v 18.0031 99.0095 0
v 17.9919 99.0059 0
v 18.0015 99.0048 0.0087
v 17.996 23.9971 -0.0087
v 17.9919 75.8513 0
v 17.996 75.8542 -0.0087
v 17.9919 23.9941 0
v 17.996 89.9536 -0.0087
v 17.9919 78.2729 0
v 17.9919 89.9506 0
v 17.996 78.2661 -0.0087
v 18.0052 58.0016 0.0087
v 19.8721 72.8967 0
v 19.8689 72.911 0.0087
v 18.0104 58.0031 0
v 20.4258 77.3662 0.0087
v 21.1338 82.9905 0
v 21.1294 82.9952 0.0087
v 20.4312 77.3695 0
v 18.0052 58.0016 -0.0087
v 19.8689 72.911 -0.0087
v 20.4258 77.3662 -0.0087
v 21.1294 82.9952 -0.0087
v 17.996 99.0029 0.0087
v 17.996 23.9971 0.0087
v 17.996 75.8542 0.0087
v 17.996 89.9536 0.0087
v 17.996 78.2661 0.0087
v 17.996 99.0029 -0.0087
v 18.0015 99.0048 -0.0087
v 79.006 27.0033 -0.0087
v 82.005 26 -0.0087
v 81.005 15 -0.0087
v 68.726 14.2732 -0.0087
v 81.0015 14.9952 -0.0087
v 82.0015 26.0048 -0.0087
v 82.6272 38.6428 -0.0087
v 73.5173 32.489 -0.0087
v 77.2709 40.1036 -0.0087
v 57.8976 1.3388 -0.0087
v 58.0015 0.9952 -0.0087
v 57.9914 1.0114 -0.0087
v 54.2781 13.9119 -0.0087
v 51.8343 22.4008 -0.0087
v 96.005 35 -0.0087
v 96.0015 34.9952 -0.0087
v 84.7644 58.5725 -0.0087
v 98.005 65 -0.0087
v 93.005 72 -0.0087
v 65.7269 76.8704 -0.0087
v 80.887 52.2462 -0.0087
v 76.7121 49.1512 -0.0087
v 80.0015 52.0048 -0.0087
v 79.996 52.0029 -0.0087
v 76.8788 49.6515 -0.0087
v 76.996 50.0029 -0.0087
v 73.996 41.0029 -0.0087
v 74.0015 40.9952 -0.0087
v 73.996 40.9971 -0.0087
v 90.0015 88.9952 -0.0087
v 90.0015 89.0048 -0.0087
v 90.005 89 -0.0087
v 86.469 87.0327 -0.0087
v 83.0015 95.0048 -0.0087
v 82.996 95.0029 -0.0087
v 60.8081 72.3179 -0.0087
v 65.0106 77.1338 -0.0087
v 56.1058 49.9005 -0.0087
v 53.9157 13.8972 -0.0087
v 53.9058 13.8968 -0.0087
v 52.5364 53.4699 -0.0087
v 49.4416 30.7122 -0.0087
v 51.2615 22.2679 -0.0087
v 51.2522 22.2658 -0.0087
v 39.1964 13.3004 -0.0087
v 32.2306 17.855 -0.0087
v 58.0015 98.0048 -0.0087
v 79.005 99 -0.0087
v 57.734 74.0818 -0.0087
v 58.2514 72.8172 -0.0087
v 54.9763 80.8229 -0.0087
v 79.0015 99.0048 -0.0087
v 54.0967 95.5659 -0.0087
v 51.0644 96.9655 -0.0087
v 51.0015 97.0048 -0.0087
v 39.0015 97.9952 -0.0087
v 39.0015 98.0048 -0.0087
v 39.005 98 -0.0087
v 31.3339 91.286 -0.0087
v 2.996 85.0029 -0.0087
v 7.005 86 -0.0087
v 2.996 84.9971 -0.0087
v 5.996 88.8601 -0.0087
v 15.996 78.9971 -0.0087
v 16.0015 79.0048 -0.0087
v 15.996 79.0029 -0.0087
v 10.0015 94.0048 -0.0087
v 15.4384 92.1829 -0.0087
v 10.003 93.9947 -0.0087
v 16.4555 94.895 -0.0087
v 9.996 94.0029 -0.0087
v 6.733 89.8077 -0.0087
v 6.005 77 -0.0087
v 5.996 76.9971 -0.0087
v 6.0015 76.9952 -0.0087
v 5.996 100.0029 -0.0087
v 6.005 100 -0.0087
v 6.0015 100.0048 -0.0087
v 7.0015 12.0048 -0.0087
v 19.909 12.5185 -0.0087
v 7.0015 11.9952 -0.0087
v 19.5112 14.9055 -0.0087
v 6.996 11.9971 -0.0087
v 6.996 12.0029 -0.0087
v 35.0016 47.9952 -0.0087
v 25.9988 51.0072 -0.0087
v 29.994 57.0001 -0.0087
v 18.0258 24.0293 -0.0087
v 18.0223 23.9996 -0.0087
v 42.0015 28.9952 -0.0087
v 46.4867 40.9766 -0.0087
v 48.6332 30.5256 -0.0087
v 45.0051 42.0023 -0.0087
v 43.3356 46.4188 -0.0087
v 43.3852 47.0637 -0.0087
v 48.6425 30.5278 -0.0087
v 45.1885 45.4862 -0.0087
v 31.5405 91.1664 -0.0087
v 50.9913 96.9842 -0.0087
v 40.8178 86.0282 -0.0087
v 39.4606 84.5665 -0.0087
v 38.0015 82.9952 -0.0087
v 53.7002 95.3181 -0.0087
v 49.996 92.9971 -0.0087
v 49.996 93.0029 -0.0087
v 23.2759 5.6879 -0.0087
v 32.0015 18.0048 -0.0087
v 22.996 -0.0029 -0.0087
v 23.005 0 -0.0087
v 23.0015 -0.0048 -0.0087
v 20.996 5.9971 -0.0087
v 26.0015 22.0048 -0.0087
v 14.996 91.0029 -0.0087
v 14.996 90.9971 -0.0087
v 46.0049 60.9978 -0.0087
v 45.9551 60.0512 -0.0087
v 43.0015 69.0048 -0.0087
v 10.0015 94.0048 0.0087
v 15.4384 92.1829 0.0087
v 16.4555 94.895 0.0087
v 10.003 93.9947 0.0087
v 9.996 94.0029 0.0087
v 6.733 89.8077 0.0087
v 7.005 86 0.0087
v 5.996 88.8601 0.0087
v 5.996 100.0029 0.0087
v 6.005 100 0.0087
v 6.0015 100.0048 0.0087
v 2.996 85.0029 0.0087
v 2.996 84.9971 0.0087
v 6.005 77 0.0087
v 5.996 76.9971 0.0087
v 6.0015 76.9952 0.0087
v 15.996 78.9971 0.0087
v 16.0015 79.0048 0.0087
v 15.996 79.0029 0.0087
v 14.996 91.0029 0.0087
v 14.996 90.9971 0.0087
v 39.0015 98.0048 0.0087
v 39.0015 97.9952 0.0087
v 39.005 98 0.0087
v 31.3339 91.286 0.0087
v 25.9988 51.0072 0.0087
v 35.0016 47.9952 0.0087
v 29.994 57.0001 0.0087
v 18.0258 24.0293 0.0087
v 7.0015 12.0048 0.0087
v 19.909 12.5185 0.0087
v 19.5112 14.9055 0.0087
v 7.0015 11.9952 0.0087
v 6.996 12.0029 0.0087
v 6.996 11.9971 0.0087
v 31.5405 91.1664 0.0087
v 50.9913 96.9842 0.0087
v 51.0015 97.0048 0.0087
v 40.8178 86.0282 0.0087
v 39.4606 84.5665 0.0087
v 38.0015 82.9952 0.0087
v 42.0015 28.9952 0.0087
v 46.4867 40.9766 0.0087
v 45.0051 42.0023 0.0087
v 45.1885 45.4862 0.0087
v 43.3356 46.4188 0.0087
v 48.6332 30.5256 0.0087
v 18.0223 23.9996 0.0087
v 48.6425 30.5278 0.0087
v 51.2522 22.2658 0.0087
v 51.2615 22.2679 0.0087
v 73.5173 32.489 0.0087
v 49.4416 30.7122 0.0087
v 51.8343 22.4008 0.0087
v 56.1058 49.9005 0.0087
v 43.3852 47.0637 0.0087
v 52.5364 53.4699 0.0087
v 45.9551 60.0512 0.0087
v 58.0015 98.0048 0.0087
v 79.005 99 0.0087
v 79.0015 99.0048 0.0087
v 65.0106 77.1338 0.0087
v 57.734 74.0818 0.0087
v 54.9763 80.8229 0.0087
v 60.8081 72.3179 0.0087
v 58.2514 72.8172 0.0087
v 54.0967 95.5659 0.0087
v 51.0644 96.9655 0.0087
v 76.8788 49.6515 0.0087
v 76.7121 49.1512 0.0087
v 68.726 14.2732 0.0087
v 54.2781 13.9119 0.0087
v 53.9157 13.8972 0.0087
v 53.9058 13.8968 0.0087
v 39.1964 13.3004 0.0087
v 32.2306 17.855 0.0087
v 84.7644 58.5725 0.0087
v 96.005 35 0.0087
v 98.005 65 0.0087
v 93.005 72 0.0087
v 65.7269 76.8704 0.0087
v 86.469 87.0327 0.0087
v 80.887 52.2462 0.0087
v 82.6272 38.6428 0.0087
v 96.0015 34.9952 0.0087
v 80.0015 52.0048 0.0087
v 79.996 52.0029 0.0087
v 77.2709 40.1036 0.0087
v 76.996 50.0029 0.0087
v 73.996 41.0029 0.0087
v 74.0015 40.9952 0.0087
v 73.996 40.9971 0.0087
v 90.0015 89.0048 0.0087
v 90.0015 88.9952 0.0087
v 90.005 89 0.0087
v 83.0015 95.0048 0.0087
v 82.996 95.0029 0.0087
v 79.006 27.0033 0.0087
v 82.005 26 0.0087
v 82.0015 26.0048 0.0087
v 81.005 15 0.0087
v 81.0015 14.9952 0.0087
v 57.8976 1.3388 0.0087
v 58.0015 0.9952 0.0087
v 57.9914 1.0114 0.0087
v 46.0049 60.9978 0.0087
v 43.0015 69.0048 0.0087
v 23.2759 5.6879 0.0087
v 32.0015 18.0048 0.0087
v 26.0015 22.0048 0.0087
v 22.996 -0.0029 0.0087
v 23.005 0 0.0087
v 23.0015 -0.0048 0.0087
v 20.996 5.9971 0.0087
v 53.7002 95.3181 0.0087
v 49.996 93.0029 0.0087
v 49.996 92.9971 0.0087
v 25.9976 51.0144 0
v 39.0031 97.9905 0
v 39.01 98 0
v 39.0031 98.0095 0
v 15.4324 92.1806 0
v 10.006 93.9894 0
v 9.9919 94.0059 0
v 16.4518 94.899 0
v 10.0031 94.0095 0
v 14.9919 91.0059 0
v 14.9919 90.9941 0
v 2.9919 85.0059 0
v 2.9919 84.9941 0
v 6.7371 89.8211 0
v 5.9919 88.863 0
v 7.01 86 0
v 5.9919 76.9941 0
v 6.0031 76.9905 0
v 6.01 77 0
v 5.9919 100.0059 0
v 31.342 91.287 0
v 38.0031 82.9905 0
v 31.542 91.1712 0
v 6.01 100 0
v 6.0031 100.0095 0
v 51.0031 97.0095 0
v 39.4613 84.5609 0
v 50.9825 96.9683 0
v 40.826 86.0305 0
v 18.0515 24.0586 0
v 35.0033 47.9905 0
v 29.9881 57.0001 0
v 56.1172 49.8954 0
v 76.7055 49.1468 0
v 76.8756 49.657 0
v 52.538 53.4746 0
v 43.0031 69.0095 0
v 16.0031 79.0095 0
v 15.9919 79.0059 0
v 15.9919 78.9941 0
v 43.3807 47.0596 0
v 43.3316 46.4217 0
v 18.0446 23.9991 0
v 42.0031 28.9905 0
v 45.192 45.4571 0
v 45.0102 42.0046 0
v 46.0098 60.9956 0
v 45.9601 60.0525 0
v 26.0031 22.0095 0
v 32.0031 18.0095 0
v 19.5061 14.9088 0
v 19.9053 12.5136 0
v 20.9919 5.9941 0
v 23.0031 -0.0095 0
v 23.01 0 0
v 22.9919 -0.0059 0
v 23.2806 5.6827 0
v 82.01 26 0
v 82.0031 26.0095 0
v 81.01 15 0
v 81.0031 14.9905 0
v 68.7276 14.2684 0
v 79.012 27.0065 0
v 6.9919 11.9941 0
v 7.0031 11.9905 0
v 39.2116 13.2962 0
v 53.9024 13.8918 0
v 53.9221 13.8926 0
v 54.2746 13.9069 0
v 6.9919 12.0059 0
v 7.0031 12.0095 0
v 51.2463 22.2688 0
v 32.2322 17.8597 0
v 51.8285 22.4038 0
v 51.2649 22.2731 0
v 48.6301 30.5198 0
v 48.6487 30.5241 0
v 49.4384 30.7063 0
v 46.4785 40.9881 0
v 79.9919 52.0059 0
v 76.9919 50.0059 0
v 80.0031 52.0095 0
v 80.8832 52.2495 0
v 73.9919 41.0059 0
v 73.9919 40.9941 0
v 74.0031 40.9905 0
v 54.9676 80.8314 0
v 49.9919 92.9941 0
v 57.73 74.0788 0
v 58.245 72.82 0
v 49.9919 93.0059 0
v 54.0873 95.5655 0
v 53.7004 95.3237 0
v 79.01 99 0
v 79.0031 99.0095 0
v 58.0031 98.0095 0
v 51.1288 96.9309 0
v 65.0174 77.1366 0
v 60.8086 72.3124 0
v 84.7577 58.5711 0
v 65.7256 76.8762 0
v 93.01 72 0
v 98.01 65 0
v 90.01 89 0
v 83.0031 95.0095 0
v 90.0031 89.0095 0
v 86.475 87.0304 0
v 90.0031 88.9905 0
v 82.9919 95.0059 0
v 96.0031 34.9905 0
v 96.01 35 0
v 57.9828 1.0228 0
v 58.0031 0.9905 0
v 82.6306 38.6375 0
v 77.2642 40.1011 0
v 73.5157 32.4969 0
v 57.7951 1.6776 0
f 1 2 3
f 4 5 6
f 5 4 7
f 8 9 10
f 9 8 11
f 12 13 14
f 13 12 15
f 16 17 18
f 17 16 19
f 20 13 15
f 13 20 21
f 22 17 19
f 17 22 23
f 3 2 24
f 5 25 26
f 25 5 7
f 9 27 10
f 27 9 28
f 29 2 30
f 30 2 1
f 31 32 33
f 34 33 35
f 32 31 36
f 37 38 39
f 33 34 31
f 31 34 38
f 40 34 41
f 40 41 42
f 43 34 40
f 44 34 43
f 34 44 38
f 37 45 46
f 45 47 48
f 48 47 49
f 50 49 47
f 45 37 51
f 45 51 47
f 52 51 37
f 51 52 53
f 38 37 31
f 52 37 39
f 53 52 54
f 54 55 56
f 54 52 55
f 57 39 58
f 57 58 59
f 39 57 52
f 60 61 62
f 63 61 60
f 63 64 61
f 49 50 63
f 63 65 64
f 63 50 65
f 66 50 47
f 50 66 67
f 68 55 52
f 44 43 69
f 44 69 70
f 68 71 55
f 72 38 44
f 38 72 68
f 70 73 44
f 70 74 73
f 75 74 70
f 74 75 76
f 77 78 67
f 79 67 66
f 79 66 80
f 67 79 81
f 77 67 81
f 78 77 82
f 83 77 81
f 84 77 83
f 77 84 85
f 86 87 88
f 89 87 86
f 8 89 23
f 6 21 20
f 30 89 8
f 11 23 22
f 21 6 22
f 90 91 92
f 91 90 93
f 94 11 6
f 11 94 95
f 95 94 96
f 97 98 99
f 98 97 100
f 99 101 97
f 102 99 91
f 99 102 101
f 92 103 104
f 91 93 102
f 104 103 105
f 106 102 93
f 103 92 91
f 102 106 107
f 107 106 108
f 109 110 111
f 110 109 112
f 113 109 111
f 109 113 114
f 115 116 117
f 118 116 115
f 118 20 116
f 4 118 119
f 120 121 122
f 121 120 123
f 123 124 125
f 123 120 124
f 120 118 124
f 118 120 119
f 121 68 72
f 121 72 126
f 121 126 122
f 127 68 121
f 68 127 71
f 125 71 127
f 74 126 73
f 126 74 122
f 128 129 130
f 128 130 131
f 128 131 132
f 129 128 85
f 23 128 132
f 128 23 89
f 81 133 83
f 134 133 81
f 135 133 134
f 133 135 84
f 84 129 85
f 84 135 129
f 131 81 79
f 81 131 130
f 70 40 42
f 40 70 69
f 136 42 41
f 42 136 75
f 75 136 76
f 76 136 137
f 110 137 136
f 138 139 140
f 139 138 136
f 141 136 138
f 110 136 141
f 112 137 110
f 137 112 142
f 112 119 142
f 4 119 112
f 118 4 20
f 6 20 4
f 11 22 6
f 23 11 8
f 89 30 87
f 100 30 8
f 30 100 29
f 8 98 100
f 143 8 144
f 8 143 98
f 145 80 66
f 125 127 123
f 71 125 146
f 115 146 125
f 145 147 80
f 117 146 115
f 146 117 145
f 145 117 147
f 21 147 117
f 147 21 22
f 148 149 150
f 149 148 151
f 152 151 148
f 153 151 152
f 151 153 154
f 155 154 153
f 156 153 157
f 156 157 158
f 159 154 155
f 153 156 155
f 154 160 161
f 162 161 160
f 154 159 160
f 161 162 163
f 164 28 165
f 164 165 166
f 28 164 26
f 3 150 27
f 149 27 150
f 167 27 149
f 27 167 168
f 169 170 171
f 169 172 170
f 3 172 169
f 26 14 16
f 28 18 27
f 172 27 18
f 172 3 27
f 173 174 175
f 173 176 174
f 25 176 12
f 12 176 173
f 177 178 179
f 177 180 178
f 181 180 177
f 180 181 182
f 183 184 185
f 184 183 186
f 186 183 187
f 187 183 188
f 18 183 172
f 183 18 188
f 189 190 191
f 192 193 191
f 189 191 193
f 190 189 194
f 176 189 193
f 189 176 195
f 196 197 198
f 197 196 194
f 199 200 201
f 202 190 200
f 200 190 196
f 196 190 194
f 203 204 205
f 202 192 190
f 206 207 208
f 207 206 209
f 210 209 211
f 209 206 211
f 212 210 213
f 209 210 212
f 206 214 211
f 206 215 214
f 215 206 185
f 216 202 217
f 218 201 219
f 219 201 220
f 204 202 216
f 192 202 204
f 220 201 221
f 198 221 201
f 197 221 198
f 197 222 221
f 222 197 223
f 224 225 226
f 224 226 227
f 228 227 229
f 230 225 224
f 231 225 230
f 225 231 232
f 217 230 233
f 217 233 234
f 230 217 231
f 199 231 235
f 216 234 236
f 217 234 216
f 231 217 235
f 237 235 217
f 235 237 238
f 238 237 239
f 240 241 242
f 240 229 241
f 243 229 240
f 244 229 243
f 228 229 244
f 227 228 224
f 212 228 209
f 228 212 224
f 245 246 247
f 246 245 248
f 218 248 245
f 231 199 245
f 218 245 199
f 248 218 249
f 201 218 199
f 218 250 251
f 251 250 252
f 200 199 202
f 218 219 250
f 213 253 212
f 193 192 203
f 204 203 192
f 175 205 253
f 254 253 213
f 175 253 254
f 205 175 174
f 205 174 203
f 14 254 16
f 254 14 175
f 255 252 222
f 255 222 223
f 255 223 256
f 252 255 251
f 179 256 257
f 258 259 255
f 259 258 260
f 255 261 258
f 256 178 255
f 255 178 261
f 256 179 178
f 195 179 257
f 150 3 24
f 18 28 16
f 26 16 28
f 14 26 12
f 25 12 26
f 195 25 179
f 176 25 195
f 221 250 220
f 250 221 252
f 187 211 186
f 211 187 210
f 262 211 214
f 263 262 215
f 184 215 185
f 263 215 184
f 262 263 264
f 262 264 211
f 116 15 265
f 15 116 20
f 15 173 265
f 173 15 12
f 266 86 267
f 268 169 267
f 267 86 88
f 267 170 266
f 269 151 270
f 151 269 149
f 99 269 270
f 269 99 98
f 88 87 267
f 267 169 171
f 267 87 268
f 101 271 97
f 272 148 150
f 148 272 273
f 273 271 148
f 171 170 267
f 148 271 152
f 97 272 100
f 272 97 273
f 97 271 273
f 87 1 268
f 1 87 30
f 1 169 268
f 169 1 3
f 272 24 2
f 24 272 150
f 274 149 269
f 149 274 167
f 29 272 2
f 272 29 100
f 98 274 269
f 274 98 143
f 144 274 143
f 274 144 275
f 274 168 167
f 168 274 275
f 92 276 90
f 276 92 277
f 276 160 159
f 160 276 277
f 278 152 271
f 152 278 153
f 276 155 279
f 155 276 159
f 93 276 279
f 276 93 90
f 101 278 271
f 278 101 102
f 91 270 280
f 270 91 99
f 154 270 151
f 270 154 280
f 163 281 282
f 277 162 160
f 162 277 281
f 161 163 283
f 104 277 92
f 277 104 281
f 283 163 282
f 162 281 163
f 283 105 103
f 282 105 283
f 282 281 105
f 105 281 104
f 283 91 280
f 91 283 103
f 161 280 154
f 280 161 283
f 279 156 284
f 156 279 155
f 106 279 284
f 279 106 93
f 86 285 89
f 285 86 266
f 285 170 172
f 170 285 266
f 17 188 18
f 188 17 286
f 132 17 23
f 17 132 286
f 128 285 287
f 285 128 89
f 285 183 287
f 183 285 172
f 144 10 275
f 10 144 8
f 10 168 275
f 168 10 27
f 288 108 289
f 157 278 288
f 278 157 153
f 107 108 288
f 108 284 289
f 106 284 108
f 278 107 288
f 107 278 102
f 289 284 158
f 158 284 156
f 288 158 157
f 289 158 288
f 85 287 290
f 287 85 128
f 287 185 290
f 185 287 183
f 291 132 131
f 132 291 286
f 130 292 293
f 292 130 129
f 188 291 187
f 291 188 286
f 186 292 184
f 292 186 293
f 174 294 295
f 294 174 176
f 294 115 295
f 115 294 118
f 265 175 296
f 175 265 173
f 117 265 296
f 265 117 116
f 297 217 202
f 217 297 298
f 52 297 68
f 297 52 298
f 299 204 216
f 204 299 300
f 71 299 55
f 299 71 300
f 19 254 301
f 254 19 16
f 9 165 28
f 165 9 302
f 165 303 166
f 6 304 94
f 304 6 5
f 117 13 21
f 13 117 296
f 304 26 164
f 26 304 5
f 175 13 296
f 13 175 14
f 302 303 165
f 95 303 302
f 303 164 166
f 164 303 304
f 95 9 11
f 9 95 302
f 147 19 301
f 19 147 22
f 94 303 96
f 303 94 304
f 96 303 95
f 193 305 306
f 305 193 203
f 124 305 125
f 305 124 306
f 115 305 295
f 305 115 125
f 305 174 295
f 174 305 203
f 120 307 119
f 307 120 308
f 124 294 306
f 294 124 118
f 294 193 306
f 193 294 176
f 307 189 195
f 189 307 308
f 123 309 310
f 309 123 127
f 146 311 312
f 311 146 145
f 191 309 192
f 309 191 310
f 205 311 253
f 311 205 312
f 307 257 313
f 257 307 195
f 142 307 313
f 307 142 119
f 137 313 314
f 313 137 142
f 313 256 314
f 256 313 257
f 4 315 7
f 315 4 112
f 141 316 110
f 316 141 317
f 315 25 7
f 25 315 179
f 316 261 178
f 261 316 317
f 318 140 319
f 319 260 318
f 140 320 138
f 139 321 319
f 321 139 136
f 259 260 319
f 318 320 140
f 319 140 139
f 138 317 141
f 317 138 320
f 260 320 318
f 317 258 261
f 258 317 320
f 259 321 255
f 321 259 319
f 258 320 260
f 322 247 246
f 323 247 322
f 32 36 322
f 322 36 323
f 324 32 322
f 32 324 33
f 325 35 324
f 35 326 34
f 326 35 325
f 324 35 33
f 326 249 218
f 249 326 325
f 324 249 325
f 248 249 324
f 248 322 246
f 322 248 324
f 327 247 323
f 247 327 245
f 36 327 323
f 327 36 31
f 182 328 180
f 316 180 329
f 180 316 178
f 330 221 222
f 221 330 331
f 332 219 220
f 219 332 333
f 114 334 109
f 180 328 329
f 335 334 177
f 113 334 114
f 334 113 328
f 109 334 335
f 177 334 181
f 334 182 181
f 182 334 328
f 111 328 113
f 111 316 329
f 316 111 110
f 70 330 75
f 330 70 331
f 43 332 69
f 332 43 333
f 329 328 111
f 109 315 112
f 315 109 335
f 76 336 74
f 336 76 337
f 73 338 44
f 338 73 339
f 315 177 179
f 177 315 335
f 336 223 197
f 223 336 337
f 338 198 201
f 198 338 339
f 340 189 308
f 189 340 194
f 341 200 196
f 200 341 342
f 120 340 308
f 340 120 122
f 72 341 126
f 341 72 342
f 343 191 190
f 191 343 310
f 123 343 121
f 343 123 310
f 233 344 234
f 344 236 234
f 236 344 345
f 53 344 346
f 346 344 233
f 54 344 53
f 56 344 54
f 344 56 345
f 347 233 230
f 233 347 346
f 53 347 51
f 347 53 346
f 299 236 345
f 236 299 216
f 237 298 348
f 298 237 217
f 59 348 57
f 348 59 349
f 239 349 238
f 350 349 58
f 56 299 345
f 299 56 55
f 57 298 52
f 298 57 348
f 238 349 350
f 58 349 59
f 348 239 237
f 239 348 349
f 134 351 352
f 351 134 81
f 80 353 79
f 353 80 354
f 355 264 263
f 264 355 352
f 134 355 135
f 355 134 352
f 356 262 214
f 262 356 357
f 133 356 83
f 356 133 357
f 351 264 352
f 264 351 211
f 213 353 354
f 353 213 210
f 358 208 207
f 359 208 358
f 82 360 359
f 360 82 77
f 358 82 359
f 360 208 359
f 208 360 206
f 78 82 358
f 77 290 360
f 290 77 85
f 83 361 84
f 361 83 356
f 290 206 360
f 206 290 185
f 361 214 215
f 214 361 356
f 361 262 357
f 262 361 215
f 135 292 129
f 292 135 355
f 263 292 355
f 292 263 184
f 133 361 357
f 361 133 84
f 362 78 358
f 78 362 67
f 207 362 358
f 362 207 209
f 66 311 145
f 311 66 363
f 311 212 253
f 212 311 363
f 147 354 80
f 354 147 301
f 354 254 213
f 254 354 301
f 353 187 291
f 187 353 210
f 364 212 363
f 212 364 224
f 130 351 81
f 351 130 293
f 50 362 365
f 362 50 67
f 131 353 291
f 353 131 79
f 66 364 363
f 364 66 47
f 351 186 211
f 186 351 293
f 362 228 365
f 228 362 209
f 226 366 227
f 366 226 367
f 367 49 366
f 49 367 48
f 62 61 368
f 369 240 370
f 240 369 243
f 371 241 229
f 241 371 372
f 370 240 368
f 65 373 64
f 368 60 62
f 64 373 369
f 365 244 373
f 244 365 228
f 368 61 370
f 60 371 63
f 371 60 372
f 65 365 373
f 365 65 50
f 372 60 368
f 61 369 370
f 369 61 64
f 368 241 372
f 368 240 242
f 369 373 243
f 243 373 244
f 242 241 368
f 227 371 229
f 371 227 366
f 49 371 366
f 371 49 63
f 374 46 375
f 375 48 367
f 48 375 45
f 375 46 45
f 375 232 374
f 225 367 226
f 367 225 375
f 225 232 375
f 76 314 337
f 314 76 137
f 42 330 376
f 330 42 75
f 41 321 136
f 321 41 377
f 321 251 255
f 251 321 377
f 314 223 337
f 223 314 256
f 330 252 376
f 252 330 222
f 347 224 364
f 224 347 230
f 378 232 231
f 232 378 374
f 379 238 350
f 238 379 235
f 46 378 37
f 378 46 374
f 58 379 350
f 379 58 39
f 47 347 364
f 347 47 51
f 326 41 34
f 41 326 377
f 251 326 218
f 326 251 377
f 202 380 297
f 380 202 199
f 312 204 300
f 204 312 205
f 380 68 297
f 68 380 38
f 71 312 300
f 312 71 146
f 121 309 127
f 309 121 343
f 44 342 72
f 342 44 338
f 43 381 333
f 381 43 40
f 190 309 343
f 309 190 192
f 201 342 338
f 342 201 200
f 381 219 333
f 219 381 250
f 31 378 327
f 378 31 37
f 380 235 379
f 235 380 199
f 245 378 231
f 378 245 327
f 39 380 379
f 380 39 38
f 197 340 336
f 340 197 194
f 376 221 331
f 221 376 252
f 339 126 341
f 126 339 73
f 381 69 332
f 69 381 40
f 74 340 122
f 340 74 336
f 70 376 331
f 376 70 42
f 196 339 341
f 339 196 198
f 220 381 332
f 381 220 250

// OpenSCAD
color([0.7462272619347637,0.5039790716190428,0.8850839351693509]) hull(){
    translate([18,58]) sphere(0.01);
    translate([22,90]) sphere(0.01);
    translate([18,99]) sphere(0.01);
}
color([0.6652757233710683,0.22263754843686523,0.08942086350367451]) hull(){
    translate([18,58]) sphere(0.01);
    translate([18,24]) sphere(0.01);
    translate([26,51]) sphere(0.01);
}
color([0.6195232841458308,0.9036720387350747,0.7222923954673625]) hull(){
    translate([22,90]) sphere(0.01);
    translate([10,94]) sphere(0.01);
    translate([39,98]) sphere(0.01);
}
color([0.6665075097113882,0.5421139713900744,0.6943978877819516]) hull(){
    translate([22,90]) sphere(0.01);
    translate([39,98]) sphere(0.01);
    translate([18,99]) sphere(0.01);
}
color([0.9269770591996176,0.12480324665016229,0.8422397758241813]) hull(){
    translate([22,90]) sphere(0.01);
    translate([20,83]) sphere(0.01);
    translate([18,99]) sphere(0.01);
}
color([0.028249143050612435,0.8554899328562455,0.6212809598996976]) hull(){
    translate([22,90]) sphere(0.01);
    translate([18,99]) sphere(0.01);
    translate([15,91]) sphere(0.01);
}
color([0.6435486749275994,0.4857227915978113,0.2898251547629681]) hull(){
    translate([10,94]) sphere(0.01);
    translate([6,84]) sphere(0.01);
    translate([3,85]) sphere(0.01);
}
color([0.21709076393122206,0.4979948584580751,0.6176241526046676]) hull(){
    translate([10,94]) sphere(0.01);
    translate([3,85]) sphere(0.01);
    translate([7,86]) sphere(0.01);
}
color([0.4722249532281336,0.7228331534363125,0.6109414561657331]) hull(){
    translate([6,84]) sphere(0.01);
    translate([3,85]) sphere(0.01);
    translate([6,77]) sphere(0.01);
}
color([0.5330085163671737,0.6769359871291822,0.5973748769978083]) hull(){
    translate([6,84]) sphere(0.01);
    translate([6,77]) sphere(0.01);
    translate([7,86]) sphere(0.01);
}
color([0.14460255854654236,0.21273280877313017,0.8417179364881341]) hull(){
    translate([39,98]) sphere(0.01);
    translate([20,83]) sphere(0.01);
    translate([31,91]) sphere(0.01);
}
color([0.6300391880279899,0.5103677782275869,0.4479627161837708]) hull(){
    translate([39,98]) sphere(0.01);
    translate([18,99]) sphere(0.01);
    translate([31,91]) sphere(0.01);
}
color([0.2903518628620462,0.1744676713524972,0.5457372127765215]) hull(){
    translate([20,83]) sphere(0.01);
    translate([18,99]) sphere(0.01);
    translate([38,83]) sphere(0.01);
}
color([0.6340658375422632,0.7004271366493812,0.690956934786038]) hull(){
    translate([18,99]) sphere(0.01);
    translate([31,91]) sphere(0.01);
    translate([37,88]) sphere(0.01);
}
color([0.013948469234104865,0.8018456354370093,0.2607079205191076]) hull(){
    translate([18,99]) sphere(0.01);
    translate([37,88]) sphere(0.01);
    translate([38,83]) sphere(0.01);
}
color([0.01899716010339858,0.7507132946374245,0.44168653561511173]) hull(){
    translate([18,99]) sphere(0.01);
    translate([38,83]) sphere(0.01);
    translate([15,91]) sphere(0.01);
}
color([0.1668653701245908,0.45955837321901094,0.7876756969907556]) hull(){
    translate([6,77]) sphere(0.01);
    translate([7,86]) sphere(0.01);
    translate([6,100]) sphere(0.01);
}
color([0.09564527702692727,0.06733136152719421,0.7816649665975636]) hull(){
    translate([31,91]) sphere(0.01);
    translate([37,88]) sphere(0.01);
    translate([51,97]) sphere(0.01);
}
color([0.030385075649315252,0.33346286891595733,0.08647112242809318]) hull(){
    translate([31,91]) sphere(0.01);
    translate([38,83]) sphere(0.01);
    translate([30,90]) sphere(0.01);
}
color([0.8161439782233904,0.05657658467482607,0.8243668117903717]) hull(){
    translate([37,88]) sphere(0.01);
    translate([51,97]) sphere(0.01);
    translate([38,83]) sphere(0.01);
}
color([0.05808931884644186,0.6181904095369413,0.1426995958976538]) hull(){
    translate([18,24]) sphere(0.01);
    translate([26,51]) sphere(0.01);
    translate([35,48]) sphere(0.01);
}
color([0.3846464495954227,0.3794414211645075,0.7643773332264734]) hull(){
    translate([18,24]) sphere(0.01);
    translate([35,48]) sphere(0.01);
    translate([30,57]) sphere(0.01);
}
color([0.3116889002403487,0.7690158776827113,0.7674729074453902]) hull(){
    translate([26,51]) sphere(0.01);
    translate([35,48]) sphere(0.01);
    translate([30,57]) sphere(0.01);
}
color([0.3394448706328078,0.45855440081433096,0.0007502935671159783]) hull(){
    translate([26,51]) sphere(0.01);
    translate([30,57]) sphere(0.01);
    translate([81,49]) sphere(0.01);
}
color([0.8084995756647368,0.0331322283588068,0.9954935019736515]) hull(){
    translate([35,48]) sphere(0.01);
    translate([30,57]) sphere(0.01);
    translate([43,69]) sphere(0.01);
}
color([0.32750610520168044,0.511786711221762,0.09639677946248049]) hull(){
    translate([30,57]) sphere(0.01);
    translate([16,79]) sphere(0.01);
    translate([43,69]) sphere(0.01);
}
color([0.46647601470953737,0.043404226035316795,0.8089506697449751]) hull(){
    translate([30,57]) sphere(0.01);
    translate([43,69]) sphere(0.01);
    translate([46,61]) sphere(0.01);
}
color([0.9065579579370614,0.48874197586323487,0.4689182776921319]) hull(){
    translate([30,57]) sphere(0.01);
    translate([46,61]) sphere(0.01);
    translate([39,67]) sphere(0.01);
}
color([0.9999833648369341,0.42392948264922625,0.11056216143511133]) hull(){
    translate([44,55]) sphere(0.01);
    translate([42,29]) sphere(0.01);
    translate([44,47]) sphere(0.01);
}
color([0.5007484231317689,0.23725843071495933,0.7435751616565288]) hull(){
    translate([44,55]) sphere(0.01);
    translate([44,47]) sphere(0.01);
    translate([35,48]) sphere(0.01);
}
color([0.030326511183225713,0.9534383365251057,0.44454391677925087]) hull(){
    translate([42,29]) sphere(0.01);
    translate([18,24]) sphere(0.01);
    translate([44,47]) sphere(0.01);
}
color([0.4017260225039573,0.6984802625757133,0.14751428227125585]) hull(){
    translate([42,29]) sphere(0.01);
    translate([44,47]) sphere(0.01);
    translate([45,42]) sphere(0.01);
}
color([0.592053202978914,0.7602792343344718,0.23214841748979886]) hull(){
    translate([44,47]) sphere(0.01);
    translate([35,48]) sphere(0.01);
    translate([43,69]) sphere(0.01);
}
color([0.2215781656479593,0.24536616409996503,0.7021925659500807]) hull(){
    translate([44,47]) sphere(0.01);
    translate([43,69]) sphere(0.01);
    translate([46,61]) sphere(0.01);
}
color([0.5457605096294114,0.54011508338913,0.5459453680001618]) hull(){
    translate([44,47]) sphere(0.01);
    translate([46,61]) sphere(0.01);
    translate([45,42]) sphere(0.01);
}
color([0.21439919344985514,0.4167057873106884,0.6193494045718565]) hull(){
    translate([46,61]) sphere(0.01);
    translate([39,67]) sphere(0.01);
    translate([45,42]) sphere(0.01);
}
color([0.45760594266221877,0.8933837090972113,0.8109172526149769]) hull(){
    translate([26,22]) sphere(0.01);
    translate([18,24]) sphere(0.01);
    translate([24,21]) sphere(0.01);
}
color([0.14833972802097417,0.6068004170768148,0.5080529466064481]) hull(){
    translate([26,22]) sphere(0.01);
    translate([24,21]) sphere(0.01);
    translate([32,18]) sphere(0.01);
}
color([0.9906187087676633,0.11352393843166497,0.6883720652754897]) hull(){
    translate([18,24]) sphere(0.01);
    translate([24,21]) sphere(0.01);
    translate([21,6]) sphere(0.01);
}
color([0.5952346609945763,0.6540807806784664,0.3474259839548979]) hull(){
    translate([23,0]) sphere(0.01);
    translate([24,21]) sphere(0.01);
    translate([21,6]) sphere(0.01);
}
color([0.9928586924360654,0.247192741454632,0.70975753974483]) hull(){
    translate([24,21]) sphere(0.01);
    translate([32,18]) sphere(0.01);
    translate([21,6]) sphere(0.01);
}
color([0.13794757021236903,0.4611444179186315,0.04899626755467579]) hull(){
    translate([64,14]) sphere(0.01);
    translate([68,15]) sphere(0.01);
    translate([82,26]) sphere(0.01);
}
color([0.1977229983916683,0.036370797334404625,0.13840798504488894]) hull(){
    translate([64,14]) sphere(0.01);
    translate([82,26]) sphere(0.01);
    translate([81,15]) sphere(0.01);
}
color([0.695134065044521,0.2654011745990712,0.4635417367699751]) hull(){
    translate([64,14]) sphere(0.01);
    translate([81,15]) sphere(0.01);
    translate([72,20]) sphere(0.01);
}
color([0.14067843926211876,0.3233092624720053,0.6766209265725885]) hull(){
    translate([68,15]) sphere(0.01);
    translate([82,26]) sphere(0.01);
    translate([76,28]) sphere(0.01);
}
color([0.5598941248919586,0.2674263193966361,0.7715367321750608]) hull(){
    translate([68,15]) sphere(0.01);
    translate([81,15]) sphere(0.01);
    translate([7,12]) sphere(0.01);
}
color([0.7775867750177572,0.3358457771023752,0.7984986383285079]) hull(){
    translate([68,15]) sphere(0.01);
    translate([7,12]) sphere(0.01);
    translate([76,28]) sphere(0.01);
}
color([0.3608344962449672,0.130636609727118,0.1470050456404287]) hull(){
    translate([82,26]) sphere(0.01);
    translate([81,15]) sphere(0.01);
    translate([79,27]) sphere(0.01);
}
color([0.5817121628313788,0.46286602772829477,0.8824527290015699]) hull(){
    translate([81,15]) sphere(0.01);
    translate([72,20]) sphere(0.01);
    translate([79,27]) sphere(0.01);
}
color([0.1201105517589024,0.1938197880719691,0.4695931850983104]) hull(){
    translate([58,33]) sphere(0.01);
    translate([42,29]) sphere(0.01);
    translate([55,32]) sphere(0.01);
}
color([0.14078313852784263,0.6451769219884874,0.9811903017448982]) hull(){
    translate([58,33]) sphere(0.01);
    translate([42,29]) sphere(0.01);
    translate([45,42]) sphere(0.01);
}
color([0.8740229692652243,0.6541461711493592,0.21289315855754942]) hull(){
    translate([42,29]) sphere(0.01);
    translate([55,32]) sphere(0.01);
    translate([45,42]) sphere(0.01);
}
color([0.9328418457966335,0.42345059226773774,0.5012376899041451]) hull(){
    translate([80,52]) sphere(0.01);
    translate([77,50]) sphere(0.01);
    translate([81,49]) sphere(0.01);
}
color([0.5811541702347708,0.2791891573101454,0.2092311813057095]) hull(){
    translate([80,52]) sphere(0.01);
    translate([81,49]) sphere(0.01);
    translate([75,43]) sphere(0.01);
}
color([0.9628933046967749,0.6198760626942967,0.5999578261672418]) hull(){
    translate([80,52]) sphere(0.01);
    translate([75,43]) sphere(0.01);
    translate([91,55]) sphere(0.01);
}
color([0.23874719597172656,0.5159213977515871,0.8042715508319355]) hull(){
    translate([77,50]) sphere(0.01);
    translate([81,49]) sphere(0.01);
    translate([74,41]) sphere(0.01);
}
color([0.6755197251802578,0.41487488756696345,0.5733633065217538]) hull(){
    translate([77,50]) sphere(0.01);
    translate([75,43]) sphere(0.01);
    translate([74,41]) sphere(0.01);
}
color([0.8352652083788017,0.4789645616530247,0.8888242662849705]) hull(){
    translate([81,49]) sphere(0.01);
    translate([75,43]) sphere(0.01);
    translate([98,65]) sphere(0.01);
}
color([0.7977003312522131,0.4430245559395397,0.5757872208285841]) hull(){
    translate([58,98]) sphere(0.01);
    translate([50,93]) sphere(0.01);
    translate([59,71]) sphere(0.01);
}
color([0.18894415855786206,0.8084526775944827,0.5240727557148024]) hull(){
    translate([58,98]) sphere(0.01);
    translate([59,71]) sphere(0.01);
    translate([70,96]) sphere(0.01);
}
color([0.33009817895383553,0.6358447971330878,0.274476683198677]) hull(){
    translate([58,98]) sphere(0.01);
    translate([70,96]) sphere(0.01);
    translate([79,99]) sphere(0.01);
}
color([0.7036882936284021,0.9548751840233447,0.5755708060880032]) hull(){
    translate([58,98]) sphere(0.01);
    translate([79,99]) sphere(0.01);
    translate([64,91]) sphere(0.01);
}
color([0.41204698353559877,0.5796286851254486,0.28286322414623355]) hull(){
    translate([58,98]) sphere(0.01);
    translate([64,91]) sphere(0.01);
    translate([51,97]) sphere(0.01);
}
color([0.83488960487533,0.7968053445508819,0.9111606805714901]) hull(){
    translate([50,93]) sphere(0.01);
    translate([59,71]) sphere(0.01);
    translate([64,91]) sphere(0.01);
}
color([0.24277728252059738,0.2698201644401115,0.25372921938475945]) hull(){
    translate([50,93]) sphere(0.01);
    translate([64,91]) sphere(0.01);
    translate([67,87]) sphere(0.01);
}
color([0.3248429479181304,0.33731838939050207,0.46012102584031667]) hull(){
    translate([50,93]) sphere(0.01);
    translate([67,87]) sphere(0.01);
    translate([51,97]) sphere(0.01);
}
color([0.4972140619467261,0.4460540182101679,0.582257111213957]) hull(){
    translate([59,71]) sphere(0.01);
    translate([70,96]) sphere(0.01);
    translate([64,91]) sphere(0.01);
}
color([0.38189019333285656,0.9329183366158048,0.74346568951076]) hull(){
    translate([59,71]) sphere(0.01);
    translate([64,91]) sphere(0.01);
    translate([63,74]) sphere(0.01);
}
color([0.10367473231816282,0.6513301228797536,0.21210212161149367]) hull(){
    translate([70,96]) sphere(0.01);
    translate([79,99]) sphere(0.01);
    translate([63,74]) sphere(0.01);
}
color([0.4071949612628585,0.6715659813617996,0.17871221391606673]) hull(){
    translate([79,99]) sphere(0.01);
    translate([64,91]) sphere(0.01);
    translate([63,74]) sphere(0.01);
}
color([0.17752412341011714,0.6556599876579107,0.7040052939421468]) hull(){
    translate([64,91]) sphere(0.01);
    translate([67,87]) sphere(0.01);
    translate([63,74]) sphere(0.01);
}
color([0.9236087761692187,0.21340315940002685,0.5989435772305987]) hull(){
    translate([67,87]) sphere(0.01);
    translate([51,97]) sphere(0.01);
    translate([63,74]) sphere(0.01);
}
color([0.8450733127471588,0.6003349610680997,0.5954496070156984]) hull(){
    translate([43,69]) sphere(0.01);
    translate([46,61]) sphere(0.01);
    translate([63,74]) sphere(0.01);
}
color([0.920709623693076,0.4233833186292486,0.4754938941291812]) hull(){
    translate([46,61]) sphere(0.01);
    translate([63,74]) sphere(0.01);
    translate([39,67]) sphere(0.01);
}
color([0.872421437716006,0.9767589381362137,0.9086126193256788]) hull(){
    translate([30,90]) sphere(0.01);
    translate([91,55]) sphere(0.01);
    translate([98,65]) sphere(0.01);
}
color([0.7884233486788577,0.8262914624918754,0.6636415038118221]) hull(){
    translate([98,65]) sphere(0.01);
    translate([63,74]) sphere(0.01);
    translate([93,72]) sphere(0.01);
}
color([0.36270118963089737,0.5138414630226216,0.14357255994509865]) hull(){
    translate([63,74]) sphere(0.01);
    translate([90,89]) sphere(0.01);
    translate([83,95]) sphere(0.01);
}
color([0.466624584989368,0.29734697142143796,0.9844700368526675]) hull(){
    translate([63,74]) sphere(0.01);
    translate([83,95]) sphere(0.01);
    translate([93,72]) sphere(0.01);
}
color([0.6752891164641136,0.29017518075598103,0.4342964607752302]) hull(){
    translate([91,55]) sphere(0.01);
    translate([98,65]) sphere(0.01);
    translate([96,35]) sphere(0.01);
}
color([0.773003957160343,0.565247166210502,0.9239404304157245]) hull(){
    translate([91,55]) sphere(0.01);
    translate([96,35]) sphere(0.01);
    translate([93,72]) sphere(0.01);
}
color([0.16032310979410902,0.8355206000915061,0.5688487402091276]) hull(){
    translate([98,65]) sphere(0.01);
    translate([96,35]) sphere(0.01);
    translate([93,72]) sphere(0.01);
}
color([0.20030491603062106,0.9799112189115262,0.7788088383598656]) hull(){
    translate([32,18]) sphere(0.01);
    translate([21,6]) sphere(0.01);
    translate([58,1]) sphere(0.01);
}
color([0.3331229107175697,0.956723341350572,0.8892995412421422]) hull(){
    translate([74,41]) sphere(0.01);
    translate([96,35]) sphere(0.01);
    translate([93,72]) sphere(0.01);
}
color([0.9938355783742772,0.5564778243748569,0.9329279768345969]) hull(){
    translate([39,67]) sphere(0.01);
    translate([79,27]) sphere(0.01);
    translate([58,1]) sphere(0.01);
}
color([0.35340897744289224,0.12062022214202717,0.7238287945893779]) hull(){
    translate([79,27]) sphere(0.01);
    translate([93,72]) sphere(0.01);
    translate([58,1]) sphere(0.01);
}
color([0.8432397019629626,0.2883830928152321,0.23139986036280558]) hull(){
    translate([45,42]) sphere(0.01);
    translate([58,1]) sphere(0.01);
    translate([58,1]) sphere(0.01);
}
